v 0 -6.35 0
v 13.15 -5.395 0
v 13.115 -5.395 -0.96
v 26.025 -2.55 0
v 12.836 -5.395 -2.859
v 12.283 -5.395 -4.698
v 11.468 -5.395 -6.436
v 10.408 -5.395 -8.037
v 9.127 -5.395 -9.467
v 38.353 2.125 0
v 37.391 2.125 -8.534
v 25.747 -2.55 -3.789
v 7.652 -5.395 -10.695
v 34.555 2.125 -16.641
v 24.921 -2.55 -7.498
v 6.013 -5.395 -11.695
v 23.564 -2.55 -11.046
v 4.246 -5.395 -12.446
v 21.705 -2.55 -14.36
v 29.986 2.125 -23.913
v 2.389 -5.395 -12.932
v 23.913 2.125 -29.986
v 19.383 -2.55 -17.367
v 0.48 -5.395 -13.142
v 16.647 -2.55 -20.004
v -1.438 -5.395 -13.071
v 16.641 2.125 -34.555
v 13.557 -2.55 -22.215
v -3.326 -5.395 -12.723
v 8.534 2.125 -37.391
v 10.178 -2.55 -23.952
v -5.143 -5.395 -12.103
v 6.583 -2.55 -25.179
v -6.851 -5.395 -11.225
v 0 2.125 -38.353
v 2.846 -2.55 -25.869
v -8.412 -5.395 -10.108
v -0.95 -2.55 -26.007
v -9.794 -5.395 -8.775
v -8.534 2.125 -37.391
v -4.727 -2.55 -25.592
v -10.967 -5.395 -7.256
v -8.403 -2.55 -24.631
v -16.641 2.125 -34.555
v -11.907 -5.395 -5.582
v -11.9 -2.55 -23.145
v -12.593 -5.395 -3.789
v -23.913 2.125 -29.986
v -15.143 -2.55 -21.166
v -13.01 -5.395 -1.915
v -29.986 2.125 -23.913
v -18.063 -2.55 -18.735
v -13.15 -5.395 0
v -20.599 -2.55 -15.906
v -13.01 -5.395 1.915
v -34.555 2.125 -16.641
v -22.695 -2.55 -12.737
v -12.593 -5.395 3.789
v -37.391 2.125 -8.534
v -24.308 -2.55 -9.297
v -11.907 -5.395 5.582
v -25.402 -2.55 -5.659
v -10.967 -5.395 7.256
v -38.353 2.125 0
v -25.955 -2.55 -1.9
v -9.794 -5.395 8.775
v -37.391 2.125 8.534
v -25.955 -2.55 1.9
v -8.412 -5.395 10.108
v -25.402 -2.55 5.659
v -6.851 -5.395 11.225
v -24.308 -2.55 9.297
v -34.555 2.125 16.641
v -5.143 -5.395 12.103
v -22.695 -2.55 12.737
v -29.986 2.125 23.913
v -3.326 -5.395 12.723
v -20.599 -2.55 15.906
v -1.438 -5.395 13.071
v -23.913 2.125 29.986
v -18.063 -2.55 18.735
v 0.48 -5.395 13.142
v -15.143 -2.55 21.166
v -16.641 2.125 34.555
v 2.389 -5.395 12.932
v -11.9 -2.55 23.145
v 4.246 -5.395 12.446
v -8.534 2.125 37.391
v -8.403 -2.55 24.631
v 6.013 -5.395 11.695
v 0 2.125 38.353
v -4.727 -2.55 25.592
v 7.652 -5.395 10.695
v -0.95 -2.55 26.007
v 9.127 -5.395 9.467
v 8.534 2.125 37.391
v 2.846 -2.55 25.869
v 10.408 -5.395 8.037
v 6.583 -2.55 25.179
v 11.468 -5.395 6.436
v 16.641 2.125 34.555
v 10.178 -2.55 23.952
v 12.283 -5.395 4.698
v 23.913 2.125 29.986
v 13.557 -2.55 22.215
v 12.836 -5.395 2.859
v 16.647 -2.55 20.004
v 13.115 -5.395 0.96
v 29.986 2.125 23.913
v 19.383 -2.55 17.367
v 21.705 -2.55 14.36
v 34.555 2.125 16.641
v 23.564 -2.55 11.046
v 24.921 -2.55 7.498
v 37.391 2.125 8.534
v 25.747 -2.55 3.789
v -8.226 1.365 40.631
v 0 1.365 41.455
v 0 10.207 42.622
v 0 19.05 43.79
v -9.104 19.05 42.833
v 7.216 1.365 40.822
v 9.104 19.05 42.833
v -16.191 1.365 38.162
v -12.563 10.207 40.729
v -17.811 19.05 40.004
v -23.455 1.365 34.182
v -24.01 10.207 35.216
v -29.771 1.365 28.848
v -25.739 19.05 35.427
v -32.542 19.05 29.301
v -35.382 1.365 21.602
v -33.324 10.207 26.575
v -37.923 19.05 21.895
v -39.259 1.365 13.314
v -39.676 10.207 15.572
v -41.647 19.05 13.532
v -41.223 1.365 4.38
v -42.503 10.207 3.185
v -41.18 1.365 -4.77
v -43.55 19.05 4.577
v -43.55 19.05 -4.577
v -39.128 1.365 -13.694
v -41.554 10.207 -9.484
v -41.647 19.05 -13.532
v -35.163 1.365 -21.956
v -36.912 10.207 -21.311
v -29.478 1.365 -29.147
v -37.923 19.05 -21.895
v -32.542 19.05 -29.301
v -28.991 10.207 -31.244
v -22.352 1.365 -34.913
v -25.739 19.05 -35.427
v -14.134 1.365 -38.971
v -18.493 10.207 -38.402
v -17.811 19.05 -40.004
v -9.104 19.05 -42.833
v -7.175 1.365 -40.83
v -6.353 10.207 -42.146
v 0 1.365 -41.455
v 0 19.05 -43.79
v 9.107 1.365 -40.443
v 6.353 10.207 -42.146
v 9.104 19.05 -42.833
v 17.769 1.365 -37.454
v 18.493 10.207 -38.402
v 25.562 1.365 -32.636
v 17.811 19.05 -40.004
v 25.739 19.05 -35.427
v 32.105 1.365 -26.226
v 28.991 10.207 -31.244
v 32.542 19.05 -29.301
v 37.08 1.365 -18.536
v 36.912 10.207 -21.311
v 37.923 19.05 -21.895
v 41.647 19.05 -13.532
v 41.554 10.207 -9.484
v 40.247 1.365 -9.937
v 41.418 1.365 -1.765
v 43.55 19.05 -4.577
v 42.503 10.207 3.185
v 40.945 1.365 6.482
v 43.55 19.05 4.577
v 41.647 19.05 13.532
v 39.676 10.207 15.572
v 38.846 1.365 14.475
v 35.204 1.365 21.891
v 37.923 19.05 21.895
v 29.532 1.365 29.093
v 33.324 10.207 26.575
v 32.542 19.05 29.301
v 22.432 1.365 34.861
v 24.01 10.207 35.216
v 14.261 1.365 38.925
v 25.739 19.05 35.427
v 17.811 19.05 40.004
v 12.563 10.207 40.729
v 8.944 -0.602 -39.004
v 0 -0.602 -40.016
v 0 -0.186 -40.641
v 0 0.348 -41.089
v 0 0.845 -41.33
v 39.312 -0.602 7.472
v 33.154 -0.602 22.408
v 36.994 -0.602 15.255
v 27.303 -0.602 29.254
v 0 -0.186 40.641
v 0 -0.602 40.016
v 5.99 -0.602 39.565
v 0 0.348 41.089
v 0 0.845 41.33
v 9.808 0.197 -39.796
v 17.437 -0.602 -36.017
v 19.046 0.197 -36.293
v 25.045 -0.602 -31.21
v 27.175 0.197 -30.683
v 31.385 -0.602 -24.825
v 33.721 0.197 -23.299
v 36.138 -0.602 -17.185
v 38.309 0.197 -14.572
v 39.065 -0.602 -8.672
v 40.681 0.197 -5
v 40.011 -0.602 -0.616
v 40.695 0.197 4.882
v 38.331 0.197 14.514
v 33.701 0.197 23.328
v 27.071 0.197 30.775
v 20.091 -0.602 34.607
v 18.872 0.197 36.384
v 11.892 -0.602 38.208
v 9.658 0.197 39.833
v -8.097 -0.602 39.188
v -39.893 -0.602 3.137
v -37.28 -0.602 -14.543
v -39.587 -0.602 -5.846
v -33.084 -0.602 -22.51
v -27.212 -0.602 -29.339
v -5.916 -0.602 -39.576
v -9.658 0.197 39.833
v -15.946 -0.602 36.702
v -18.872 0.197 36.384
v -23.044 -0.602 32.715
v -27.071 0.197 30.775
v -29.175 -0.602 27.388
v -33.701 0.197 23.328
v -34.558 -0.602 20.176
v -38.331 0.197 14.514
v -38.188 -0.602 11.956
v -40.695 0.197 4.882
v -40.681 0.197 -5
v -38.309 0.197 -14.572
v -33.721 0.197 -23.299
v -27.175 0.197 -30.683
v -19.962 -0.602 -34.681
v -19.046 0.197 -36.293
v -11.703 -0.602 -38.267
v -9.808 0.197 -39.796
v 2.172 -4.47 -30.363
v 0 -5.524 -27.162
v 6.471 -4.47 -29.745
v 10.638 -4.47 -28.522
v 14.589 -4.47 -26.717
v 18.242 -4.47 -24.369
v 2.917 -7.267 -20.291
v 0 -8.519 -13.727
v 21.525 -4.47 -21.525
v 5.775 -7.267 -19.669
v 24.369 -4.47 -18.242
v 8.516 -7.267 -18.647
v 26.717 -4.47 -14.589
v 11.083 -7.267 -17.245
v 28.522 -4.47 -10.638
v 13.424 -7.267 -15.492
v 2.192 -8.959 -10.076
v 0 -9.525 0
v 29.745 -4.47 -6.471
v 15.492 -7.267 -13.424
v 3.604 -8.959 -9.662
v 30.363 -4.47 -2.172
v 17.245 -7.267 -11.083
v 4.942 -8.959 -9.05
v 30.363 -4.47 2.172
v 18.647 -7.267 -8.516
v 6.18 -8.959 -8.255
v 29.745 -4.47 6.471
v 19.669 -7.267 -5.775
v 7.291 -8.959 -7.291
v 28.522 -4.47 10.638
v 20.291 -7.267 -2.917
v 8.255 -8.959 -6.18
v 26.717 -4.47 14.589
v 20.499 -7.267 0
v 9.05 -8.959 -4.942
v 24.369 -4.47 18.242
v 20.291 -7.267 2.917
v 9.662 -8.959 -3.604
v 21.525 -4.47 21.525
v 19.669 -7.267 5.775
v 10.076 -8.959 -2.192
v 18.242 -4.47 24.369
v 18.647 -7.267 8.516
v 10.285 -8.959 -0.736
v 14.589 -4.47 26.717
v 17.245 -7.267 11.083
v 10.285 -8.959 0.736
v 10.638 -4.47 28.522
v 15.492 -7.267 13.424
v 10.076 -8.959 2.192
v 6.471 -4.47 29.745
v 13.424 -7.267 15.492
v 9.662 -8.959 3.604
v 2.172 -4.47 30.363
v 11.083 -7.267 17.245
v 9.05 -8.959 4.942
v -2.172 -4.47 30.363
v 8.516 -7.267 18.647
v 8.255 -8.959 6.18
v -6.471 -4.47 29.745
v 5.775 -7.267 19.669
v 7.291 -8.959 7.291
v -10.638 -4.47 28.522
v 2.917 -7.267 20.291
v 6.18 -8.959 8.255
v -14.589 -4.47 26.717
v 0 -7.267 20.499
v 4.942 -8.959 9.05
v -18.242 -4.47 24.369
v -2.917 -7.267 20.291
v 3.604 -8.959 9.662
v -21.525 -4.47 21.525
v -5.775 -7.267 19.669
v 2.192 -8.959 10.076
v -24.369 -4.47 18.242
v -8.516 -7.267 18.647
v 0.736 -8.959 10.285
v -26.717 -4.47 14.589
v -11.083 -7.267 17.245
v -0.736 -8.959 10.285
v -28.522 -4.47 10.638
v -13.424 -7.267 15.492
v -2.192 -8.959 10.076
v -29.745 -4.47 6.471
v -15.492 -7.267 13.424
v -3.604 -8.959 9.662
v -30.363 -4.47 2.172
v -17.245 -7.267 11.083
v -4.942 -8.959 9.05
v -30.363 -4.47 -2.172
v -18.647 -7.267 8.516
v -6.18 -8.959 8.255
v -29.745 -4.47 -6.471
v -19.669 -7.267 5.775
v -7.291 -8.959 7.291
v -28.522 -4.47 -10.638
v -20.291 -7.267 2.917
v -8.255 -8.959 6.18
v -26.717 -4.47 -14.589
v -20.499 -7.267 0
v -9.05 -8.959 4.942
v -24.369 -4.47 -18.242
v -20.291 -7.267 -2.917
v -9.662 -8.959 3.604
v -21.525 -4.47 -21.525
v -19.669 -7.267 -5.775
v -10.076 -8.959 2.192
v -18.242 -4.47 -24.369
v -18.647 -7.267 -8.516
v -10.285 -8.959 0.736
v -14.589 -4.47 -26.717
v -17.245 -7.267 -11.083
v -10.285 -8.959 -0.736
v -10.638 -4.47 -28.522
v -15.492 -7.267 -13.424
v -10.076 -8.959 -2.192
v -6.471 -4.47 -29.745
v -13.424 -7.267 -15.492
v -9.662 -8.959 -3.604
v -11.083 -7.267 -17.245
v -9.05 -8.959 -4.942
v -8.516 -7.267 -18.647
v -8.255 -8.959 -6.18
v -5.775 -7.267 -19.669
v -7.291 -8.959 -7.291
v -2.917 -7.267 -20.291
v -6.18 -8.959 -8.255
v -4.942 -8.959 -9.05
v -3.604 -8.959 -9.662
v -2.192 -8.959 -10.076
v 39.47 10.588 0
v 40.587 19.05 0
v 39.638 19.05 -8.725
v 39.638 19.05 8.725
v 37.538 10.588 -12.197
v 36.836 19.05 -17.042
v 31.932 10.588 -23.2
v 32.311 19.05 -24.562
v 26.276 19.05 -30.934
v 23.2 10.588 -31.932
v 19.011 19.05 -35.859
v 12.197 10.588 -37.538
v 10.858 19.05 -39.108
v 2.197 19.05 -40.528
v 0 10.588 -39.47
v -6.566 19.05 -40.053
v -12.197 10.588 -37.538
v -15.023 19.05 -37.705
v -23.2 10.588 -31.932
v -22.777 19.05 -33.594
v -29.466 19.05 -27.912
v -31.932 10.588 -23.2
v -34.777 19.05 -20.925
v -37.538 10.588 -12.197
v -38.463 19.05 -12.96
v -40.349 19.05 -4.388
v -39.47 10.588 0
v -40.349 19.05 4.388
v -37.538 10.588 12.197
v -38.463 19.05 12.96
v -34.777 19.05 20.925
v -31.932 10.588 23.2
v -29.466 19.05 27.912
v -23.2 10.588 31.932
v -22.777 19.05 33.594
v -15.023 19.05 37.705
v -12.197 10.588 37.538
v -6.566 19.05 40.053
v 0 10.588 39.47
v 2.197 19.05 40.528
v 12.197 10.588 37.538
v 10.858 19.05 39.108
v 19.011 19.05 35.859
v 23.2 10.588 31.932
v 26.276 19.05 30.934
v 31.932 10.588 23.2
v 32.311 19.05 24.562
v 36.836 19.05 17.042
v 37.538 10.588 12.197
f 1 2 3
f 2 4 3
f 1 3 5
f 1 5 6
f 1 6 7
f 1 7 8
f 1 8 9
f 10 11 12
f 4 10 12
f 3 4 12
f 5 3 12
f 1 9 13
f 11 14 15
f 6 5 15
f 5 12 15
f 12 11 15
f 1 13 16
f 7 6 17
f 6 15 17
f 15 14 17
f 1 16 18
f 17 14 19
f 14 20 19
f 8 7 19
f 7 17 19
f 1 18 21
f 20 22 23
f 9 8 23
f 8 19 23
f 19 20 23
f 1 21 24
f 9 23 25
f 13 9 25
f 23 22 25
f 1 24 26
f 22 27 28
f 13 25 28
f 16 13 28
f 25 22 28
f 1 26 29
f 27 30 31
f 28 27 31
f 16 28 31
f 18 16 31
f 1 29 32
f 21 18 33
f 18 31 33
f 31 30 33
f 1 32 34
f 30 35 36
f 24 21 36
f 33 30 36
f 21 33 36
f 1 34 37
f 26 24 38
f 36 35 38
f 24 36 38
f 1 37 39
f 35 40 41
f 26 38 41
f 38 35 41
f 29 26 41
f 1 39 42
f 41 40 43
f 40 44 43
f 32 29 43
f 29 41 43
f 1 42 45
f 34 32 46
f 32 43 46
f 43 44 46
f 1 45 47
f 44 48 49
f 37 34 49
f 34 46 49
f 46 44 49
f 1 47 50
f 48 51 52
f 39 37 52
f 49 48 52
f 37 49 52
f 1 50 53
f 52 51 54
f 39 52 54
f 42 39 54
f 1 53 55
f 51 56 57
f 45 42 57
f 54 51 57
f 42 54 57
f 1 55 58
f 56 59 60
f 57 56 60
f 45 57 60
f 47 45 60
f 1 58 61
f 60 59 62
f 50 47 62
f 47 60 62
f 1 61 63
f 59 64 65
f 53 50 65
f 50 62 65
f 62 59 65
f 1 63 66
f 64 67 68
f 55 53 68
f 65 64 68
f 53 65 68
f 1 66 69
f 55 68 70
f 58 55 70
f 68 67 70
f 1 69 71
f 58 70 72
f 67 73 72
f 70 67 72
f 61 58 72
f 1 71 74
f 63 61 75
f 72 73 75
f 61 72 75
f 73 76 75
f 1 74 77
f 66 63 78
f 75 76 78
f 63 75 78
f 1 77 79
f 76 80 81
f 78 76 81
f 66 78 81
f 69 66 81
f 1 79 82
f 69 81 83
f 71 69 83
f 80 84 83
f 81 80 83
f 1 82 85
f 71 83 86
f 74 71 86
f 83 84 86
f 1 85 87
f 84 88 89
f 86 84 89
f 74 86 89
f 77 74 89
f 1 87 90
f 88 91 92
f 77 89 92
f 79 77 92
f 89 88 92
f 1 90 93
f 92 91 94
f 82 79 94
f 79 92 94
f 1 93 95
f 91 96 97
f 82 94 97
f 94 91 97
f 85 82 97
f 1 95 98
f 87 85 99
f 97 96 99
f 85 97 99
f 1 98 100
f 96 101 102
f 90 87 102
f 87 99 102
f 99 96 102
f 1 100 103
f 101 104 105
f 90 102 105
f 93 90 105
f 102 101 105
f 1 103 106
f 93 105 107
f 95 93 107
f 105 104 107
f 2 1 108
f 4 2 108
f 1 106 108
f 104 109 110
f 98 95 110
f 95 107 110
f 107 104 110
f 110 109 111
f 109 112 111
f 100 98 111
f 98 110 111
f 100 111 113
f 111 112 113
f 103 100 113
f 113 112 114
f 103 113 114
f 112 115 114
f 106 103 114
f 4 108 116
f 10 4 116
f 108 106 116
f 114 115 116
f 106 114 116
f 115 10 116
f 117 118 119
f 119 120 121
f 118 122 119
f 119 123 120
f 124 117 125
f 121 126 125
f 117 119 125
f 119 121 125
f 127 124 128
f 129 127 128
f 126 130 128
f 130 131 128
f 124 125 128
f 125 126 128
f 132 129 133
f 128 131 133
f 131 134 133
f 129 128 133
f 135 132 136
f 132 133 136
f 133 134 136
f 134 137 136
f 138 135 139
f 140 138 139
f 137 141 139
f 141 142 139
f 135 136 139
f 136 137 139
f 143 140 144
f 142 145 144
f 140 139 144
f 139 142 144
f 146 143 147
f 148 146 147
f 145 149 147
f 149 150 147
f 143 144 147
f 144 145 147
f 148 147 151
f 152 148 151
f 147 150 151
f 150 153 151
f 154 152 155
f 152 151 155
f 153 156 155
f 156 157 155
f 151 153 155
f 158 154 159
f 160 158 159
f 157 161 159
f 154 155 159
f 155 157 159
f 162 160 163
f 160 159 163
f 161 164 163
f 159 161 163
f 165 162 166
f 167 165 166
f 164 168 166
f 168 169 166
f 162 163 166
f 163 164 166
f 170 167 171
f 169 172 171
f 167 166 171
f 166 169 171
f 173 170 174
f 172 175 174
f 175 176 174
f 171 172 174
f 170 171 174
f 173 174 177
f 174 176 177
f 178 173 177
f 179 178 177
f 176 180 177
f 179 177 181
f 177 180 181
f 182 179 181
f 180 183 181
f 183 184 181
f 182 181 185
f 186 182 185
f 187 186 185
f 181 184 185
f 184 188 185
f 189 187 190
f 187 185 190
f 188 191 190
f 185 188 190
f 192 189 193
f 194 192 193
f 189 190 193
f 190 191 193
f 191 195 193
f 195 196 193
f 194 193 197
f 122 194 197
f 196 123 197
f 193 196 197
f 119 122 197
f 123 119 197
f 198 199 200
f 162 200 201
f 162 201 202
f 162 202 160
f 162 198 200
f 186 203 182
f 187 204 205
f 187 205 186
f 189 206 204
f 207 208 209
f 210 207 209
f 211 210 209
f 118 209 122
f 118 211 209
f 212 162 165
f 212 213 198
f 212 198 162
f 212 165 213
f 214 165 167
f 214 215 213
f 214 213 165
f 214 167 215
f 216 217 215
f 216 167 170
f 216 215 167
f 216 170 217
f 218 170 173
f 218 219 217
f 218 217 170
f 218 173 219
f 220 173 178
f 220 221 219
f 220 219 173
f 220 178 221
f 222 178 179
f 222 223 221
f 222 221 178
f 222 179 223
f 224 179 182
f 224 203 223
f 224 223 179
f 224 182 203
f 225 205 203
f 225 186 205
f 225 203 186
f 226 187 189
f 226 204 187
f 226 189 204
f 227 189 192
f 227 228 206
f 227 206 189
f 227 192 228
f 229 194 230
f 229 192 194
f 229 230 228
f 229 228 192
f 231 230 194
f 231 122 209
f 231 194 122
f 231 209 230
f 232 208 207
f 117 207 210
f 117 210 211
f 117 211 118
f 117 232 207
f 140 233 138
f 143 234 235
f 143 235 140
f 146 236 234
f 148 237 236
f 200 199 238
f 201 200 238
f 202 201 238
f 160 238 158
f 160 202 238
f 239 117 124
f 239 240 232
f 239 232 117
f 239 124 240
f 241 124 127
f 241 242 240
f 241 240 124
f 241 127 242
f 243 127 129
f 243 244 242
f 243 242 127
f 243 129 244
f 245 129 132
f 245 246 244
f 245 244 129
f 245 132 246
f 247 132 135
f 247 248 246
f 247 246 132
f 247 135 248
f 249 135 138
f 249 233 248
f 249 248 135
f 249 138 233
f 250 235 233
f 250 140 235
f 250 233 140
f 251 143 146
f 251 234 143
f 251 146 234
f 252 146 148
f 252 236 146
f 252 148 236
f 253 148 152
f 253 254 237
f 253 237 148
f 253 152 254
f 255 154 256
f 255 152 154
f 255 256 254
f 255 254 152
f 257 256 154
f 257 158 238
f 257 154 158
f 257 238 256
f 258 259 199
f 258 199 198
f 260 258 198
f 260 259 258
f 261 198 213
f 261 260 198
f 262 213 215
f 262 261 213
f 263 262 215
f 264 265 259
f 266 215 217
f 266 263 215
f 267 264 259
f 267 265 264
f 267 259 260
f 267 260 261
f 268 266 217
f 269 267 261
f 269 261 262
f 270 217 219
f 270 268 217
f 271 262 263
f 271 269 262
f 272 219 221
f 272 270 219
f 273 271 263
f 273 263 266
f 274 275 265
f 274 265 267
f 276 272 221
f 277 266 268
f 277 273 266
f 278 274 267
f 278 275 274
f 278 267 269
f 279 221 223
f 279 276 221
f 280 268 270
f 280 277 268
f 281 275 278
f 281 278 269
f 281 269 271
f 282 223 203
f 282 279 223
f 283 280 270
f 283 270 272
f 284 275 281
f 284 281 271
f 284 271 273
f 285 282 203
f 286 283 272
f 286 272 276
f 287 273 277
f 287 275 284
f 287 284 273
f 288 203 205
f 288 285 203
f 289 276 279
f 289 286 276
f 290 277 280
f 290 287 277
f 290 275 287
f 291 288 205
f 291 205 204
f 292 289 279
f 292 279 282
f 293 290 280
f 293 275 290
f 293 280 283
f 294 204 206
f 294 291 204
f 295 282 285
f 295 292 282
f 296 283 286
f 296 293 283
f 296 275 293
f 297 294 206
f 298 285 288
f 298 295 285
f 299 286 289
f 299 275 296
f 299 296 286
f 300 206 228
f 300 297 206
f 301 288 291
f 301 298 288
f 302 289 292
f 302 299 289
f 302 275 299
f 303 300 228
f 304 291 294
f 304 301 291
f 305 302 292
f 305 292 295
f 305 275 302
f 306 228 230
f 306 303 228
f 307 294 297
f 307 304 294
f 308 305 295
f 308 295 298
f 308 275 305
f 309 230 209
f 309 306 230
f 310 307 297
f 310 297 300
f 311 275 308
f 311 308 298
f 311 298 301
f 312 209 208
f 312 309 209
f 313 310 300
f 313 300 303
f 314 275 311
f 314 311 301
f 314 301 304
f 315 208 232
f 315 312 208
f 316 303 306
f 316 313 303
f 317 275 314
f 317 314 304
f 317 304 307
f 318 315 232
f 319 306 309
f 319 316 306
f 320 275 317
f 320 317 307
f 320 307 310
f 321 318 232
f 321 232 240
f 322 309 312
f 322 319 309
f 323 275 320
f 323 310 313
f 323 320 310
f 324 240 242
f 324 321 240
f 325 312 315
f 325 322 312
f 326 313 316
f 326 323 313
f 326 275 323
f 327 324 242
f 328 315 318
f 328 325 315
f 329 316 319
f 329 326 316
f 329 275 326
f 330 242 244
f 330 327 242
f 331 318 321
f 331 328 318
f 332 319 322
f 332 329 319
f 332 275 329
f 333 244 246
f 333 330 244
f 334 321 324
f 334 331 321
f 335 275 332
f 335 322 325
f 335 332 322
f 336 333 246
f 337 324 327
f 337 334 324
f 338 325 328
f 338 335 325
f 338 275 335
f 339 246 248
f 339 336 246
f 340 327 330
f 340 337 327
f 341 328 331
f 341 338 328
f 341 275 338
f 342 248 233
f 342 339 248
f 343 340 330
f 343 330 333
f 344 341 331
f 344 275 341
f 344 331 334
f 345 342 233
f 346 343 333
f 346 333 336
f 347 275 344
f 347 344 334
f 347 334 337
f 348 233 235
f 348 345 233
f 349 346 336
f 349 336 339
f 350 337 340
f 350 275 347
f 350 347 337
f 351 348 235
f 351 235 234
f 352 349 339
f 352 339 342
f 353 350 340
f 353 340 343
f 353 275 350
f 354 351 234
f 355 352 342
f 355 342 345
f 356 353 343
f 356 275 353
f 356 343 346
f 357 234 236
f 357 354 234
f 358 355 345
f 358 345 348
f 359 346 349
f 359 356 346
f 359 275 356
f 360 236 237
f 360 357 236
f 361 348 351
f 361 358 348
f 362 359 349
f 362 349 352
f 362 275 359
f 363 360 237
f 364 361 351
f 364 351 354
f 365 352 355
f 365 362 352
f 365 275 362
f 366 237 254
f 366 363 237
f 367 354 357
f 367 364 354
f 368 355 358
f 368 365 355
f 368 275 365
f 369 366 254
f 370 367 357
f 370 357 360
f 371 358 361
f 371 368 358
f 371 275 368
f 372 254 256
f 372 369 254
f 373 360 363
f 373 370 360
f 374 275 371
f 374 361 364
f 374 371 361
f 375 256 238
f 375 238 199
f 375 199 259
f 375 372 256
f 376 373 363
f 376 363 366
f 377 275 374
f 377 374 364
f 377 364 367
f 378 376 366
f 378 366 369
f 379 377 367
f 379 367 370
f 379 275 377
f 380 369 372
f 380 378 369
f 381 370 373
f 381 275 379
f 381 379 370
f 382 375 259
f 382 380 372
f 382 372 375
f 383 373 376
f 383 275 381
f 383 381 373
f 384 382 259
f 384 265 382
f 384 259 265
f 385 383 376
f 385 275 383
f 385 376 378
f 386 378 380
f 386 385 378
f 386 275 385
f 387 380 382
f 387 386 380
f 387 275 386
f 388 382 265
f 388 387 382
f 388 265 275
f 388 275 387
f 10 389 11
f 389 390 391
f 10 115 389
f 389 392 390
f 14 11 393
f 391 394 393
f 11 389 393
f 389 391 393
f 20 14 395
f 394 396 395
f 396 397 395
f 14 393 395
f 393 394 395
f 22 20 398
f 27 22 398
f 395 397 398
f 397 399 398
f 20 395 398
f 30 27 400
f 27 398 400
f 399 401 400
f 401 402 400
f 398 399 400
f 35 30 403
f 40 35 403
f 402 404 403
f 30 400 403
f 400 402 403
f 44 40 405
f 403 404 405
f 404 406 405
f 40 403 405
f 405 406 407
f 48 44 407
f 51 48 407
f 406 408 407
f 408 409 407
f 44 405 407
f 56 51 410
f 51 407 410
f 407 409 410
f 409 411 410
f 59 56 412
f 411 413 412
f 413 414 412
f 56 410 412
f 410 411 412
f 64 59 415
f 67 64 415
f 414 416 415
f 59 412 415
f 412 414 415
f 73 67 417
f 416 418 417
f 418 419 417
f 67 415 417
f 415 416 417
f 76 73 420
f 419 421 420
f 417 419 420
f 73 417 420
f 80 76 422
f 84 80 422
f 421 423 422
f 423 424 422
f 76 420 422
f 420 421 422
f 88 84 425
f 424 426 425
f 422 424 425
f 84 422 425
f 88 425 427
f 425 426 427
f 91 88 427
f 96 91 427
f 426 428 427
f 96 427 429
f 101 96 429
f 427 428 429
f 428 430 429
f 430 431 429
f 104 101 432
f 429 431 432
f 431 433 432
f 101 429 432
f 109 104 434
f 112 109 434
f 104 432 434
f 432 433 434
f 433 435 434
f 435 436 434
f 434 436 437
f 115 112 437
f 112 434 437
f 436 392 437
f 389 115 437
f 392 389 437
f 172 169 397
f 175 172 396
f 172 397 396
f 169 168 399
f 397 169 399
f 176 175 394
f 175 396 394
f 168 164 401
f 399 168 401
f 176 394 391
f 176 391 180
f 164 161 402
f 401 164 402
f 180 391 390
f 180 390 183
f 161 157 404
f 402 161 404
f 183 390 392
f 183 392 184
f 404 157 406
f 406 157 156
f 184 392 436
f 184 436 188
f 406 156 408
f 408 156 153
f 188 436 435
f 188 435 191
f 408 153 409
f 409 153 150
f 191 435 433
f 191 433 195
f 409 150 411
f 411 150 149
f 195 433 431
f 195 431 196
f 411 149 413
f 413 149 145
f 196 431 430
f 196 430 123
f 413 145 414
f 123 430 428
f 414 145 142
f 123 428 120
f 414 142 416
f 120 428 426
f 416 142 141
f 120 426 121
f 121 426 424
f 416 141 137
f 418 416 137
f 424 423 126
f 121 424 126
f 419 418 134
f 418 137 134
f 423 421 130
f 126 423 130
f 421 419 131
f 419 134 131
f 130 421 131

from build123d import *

# Parameters (mm, degrees)
DOME1_FACE_RADIUS = 41.275
DOME1_HEIGHT      = 9.525
FILLET1_R         = 2.54


# Read off the part's stored shape, not the designer's step: Shell1
with BuildPart() as part:
    # Sketch1 → Revolve1 (revolve)
    with BuildSketch(Plane(origin=(0, 0, 0), x_dir=(0, 0, -1), z_dir=(1, 0, 0)), mode=Mode.PRIVATE) as revolve1_sk:
        Polygon((0, 0), (41.275, 0), (43.78974535, 19.05), (0, 19.05), align=None)
    revolve(revolve1_sk.sketch.rotate(Axis((0, 0, 0), (0, -1, 0)), 180), axis=Axis((0, 0, 0), (0, -1, 0)))

    # Dome1: a dome of height H over a round flat face of radius A is a cap of a sphere of radius (A * A + H * H) / (2 * H)
    dome1_r = (DOME1_FACE_RADIUS * DOME1_FACE_RADIUS + DOME1_HEIGHT * DOME1_HEIGHT) / (2 * DOME1_HEIGHT)
    dome1_base = Plane((0, 0, 0), z_dir=(0, -1, 0))
    with Locations(dome1_base.offset(DOME1_HEIGHT - dome1_r)):
        dome1_ball = Sphere(dome1_r, mode=Mode.PRIVATE)
    add(split(dome1_ball, bisect_by=dome1_base, keep=Keep.TOP, mode=Mode.PRIVATE))

    # Fillet1
    fillet1_edges = [part.edges().sort_by_distance(p)[0] for p in [
        (41.275, 0, 0),
    ]]
    fillet(fillet1_edges, radius=FILLET1_R)

    # Shell1 outline → Shell1 (revolve, cut)
    with BuildSketch(Plane.XY):
        with BuildLine():
            Line((0, 19.05), (0, -6.35))
            ThreePointArc((0, -6.35), (19.639142672, -4.205925769), (38.353009101, 2.125281265))
            Line((38.353009101, 2.125281265), (40.587201031, 19.05))
            Line((40.587201031, 19.05), (0, 19.05))
        make_face()
    revolve(axis=Axis((0, 0, 0), (0, 1, 0)), mode=Mode.SUBTRACT)


solid = part.part
